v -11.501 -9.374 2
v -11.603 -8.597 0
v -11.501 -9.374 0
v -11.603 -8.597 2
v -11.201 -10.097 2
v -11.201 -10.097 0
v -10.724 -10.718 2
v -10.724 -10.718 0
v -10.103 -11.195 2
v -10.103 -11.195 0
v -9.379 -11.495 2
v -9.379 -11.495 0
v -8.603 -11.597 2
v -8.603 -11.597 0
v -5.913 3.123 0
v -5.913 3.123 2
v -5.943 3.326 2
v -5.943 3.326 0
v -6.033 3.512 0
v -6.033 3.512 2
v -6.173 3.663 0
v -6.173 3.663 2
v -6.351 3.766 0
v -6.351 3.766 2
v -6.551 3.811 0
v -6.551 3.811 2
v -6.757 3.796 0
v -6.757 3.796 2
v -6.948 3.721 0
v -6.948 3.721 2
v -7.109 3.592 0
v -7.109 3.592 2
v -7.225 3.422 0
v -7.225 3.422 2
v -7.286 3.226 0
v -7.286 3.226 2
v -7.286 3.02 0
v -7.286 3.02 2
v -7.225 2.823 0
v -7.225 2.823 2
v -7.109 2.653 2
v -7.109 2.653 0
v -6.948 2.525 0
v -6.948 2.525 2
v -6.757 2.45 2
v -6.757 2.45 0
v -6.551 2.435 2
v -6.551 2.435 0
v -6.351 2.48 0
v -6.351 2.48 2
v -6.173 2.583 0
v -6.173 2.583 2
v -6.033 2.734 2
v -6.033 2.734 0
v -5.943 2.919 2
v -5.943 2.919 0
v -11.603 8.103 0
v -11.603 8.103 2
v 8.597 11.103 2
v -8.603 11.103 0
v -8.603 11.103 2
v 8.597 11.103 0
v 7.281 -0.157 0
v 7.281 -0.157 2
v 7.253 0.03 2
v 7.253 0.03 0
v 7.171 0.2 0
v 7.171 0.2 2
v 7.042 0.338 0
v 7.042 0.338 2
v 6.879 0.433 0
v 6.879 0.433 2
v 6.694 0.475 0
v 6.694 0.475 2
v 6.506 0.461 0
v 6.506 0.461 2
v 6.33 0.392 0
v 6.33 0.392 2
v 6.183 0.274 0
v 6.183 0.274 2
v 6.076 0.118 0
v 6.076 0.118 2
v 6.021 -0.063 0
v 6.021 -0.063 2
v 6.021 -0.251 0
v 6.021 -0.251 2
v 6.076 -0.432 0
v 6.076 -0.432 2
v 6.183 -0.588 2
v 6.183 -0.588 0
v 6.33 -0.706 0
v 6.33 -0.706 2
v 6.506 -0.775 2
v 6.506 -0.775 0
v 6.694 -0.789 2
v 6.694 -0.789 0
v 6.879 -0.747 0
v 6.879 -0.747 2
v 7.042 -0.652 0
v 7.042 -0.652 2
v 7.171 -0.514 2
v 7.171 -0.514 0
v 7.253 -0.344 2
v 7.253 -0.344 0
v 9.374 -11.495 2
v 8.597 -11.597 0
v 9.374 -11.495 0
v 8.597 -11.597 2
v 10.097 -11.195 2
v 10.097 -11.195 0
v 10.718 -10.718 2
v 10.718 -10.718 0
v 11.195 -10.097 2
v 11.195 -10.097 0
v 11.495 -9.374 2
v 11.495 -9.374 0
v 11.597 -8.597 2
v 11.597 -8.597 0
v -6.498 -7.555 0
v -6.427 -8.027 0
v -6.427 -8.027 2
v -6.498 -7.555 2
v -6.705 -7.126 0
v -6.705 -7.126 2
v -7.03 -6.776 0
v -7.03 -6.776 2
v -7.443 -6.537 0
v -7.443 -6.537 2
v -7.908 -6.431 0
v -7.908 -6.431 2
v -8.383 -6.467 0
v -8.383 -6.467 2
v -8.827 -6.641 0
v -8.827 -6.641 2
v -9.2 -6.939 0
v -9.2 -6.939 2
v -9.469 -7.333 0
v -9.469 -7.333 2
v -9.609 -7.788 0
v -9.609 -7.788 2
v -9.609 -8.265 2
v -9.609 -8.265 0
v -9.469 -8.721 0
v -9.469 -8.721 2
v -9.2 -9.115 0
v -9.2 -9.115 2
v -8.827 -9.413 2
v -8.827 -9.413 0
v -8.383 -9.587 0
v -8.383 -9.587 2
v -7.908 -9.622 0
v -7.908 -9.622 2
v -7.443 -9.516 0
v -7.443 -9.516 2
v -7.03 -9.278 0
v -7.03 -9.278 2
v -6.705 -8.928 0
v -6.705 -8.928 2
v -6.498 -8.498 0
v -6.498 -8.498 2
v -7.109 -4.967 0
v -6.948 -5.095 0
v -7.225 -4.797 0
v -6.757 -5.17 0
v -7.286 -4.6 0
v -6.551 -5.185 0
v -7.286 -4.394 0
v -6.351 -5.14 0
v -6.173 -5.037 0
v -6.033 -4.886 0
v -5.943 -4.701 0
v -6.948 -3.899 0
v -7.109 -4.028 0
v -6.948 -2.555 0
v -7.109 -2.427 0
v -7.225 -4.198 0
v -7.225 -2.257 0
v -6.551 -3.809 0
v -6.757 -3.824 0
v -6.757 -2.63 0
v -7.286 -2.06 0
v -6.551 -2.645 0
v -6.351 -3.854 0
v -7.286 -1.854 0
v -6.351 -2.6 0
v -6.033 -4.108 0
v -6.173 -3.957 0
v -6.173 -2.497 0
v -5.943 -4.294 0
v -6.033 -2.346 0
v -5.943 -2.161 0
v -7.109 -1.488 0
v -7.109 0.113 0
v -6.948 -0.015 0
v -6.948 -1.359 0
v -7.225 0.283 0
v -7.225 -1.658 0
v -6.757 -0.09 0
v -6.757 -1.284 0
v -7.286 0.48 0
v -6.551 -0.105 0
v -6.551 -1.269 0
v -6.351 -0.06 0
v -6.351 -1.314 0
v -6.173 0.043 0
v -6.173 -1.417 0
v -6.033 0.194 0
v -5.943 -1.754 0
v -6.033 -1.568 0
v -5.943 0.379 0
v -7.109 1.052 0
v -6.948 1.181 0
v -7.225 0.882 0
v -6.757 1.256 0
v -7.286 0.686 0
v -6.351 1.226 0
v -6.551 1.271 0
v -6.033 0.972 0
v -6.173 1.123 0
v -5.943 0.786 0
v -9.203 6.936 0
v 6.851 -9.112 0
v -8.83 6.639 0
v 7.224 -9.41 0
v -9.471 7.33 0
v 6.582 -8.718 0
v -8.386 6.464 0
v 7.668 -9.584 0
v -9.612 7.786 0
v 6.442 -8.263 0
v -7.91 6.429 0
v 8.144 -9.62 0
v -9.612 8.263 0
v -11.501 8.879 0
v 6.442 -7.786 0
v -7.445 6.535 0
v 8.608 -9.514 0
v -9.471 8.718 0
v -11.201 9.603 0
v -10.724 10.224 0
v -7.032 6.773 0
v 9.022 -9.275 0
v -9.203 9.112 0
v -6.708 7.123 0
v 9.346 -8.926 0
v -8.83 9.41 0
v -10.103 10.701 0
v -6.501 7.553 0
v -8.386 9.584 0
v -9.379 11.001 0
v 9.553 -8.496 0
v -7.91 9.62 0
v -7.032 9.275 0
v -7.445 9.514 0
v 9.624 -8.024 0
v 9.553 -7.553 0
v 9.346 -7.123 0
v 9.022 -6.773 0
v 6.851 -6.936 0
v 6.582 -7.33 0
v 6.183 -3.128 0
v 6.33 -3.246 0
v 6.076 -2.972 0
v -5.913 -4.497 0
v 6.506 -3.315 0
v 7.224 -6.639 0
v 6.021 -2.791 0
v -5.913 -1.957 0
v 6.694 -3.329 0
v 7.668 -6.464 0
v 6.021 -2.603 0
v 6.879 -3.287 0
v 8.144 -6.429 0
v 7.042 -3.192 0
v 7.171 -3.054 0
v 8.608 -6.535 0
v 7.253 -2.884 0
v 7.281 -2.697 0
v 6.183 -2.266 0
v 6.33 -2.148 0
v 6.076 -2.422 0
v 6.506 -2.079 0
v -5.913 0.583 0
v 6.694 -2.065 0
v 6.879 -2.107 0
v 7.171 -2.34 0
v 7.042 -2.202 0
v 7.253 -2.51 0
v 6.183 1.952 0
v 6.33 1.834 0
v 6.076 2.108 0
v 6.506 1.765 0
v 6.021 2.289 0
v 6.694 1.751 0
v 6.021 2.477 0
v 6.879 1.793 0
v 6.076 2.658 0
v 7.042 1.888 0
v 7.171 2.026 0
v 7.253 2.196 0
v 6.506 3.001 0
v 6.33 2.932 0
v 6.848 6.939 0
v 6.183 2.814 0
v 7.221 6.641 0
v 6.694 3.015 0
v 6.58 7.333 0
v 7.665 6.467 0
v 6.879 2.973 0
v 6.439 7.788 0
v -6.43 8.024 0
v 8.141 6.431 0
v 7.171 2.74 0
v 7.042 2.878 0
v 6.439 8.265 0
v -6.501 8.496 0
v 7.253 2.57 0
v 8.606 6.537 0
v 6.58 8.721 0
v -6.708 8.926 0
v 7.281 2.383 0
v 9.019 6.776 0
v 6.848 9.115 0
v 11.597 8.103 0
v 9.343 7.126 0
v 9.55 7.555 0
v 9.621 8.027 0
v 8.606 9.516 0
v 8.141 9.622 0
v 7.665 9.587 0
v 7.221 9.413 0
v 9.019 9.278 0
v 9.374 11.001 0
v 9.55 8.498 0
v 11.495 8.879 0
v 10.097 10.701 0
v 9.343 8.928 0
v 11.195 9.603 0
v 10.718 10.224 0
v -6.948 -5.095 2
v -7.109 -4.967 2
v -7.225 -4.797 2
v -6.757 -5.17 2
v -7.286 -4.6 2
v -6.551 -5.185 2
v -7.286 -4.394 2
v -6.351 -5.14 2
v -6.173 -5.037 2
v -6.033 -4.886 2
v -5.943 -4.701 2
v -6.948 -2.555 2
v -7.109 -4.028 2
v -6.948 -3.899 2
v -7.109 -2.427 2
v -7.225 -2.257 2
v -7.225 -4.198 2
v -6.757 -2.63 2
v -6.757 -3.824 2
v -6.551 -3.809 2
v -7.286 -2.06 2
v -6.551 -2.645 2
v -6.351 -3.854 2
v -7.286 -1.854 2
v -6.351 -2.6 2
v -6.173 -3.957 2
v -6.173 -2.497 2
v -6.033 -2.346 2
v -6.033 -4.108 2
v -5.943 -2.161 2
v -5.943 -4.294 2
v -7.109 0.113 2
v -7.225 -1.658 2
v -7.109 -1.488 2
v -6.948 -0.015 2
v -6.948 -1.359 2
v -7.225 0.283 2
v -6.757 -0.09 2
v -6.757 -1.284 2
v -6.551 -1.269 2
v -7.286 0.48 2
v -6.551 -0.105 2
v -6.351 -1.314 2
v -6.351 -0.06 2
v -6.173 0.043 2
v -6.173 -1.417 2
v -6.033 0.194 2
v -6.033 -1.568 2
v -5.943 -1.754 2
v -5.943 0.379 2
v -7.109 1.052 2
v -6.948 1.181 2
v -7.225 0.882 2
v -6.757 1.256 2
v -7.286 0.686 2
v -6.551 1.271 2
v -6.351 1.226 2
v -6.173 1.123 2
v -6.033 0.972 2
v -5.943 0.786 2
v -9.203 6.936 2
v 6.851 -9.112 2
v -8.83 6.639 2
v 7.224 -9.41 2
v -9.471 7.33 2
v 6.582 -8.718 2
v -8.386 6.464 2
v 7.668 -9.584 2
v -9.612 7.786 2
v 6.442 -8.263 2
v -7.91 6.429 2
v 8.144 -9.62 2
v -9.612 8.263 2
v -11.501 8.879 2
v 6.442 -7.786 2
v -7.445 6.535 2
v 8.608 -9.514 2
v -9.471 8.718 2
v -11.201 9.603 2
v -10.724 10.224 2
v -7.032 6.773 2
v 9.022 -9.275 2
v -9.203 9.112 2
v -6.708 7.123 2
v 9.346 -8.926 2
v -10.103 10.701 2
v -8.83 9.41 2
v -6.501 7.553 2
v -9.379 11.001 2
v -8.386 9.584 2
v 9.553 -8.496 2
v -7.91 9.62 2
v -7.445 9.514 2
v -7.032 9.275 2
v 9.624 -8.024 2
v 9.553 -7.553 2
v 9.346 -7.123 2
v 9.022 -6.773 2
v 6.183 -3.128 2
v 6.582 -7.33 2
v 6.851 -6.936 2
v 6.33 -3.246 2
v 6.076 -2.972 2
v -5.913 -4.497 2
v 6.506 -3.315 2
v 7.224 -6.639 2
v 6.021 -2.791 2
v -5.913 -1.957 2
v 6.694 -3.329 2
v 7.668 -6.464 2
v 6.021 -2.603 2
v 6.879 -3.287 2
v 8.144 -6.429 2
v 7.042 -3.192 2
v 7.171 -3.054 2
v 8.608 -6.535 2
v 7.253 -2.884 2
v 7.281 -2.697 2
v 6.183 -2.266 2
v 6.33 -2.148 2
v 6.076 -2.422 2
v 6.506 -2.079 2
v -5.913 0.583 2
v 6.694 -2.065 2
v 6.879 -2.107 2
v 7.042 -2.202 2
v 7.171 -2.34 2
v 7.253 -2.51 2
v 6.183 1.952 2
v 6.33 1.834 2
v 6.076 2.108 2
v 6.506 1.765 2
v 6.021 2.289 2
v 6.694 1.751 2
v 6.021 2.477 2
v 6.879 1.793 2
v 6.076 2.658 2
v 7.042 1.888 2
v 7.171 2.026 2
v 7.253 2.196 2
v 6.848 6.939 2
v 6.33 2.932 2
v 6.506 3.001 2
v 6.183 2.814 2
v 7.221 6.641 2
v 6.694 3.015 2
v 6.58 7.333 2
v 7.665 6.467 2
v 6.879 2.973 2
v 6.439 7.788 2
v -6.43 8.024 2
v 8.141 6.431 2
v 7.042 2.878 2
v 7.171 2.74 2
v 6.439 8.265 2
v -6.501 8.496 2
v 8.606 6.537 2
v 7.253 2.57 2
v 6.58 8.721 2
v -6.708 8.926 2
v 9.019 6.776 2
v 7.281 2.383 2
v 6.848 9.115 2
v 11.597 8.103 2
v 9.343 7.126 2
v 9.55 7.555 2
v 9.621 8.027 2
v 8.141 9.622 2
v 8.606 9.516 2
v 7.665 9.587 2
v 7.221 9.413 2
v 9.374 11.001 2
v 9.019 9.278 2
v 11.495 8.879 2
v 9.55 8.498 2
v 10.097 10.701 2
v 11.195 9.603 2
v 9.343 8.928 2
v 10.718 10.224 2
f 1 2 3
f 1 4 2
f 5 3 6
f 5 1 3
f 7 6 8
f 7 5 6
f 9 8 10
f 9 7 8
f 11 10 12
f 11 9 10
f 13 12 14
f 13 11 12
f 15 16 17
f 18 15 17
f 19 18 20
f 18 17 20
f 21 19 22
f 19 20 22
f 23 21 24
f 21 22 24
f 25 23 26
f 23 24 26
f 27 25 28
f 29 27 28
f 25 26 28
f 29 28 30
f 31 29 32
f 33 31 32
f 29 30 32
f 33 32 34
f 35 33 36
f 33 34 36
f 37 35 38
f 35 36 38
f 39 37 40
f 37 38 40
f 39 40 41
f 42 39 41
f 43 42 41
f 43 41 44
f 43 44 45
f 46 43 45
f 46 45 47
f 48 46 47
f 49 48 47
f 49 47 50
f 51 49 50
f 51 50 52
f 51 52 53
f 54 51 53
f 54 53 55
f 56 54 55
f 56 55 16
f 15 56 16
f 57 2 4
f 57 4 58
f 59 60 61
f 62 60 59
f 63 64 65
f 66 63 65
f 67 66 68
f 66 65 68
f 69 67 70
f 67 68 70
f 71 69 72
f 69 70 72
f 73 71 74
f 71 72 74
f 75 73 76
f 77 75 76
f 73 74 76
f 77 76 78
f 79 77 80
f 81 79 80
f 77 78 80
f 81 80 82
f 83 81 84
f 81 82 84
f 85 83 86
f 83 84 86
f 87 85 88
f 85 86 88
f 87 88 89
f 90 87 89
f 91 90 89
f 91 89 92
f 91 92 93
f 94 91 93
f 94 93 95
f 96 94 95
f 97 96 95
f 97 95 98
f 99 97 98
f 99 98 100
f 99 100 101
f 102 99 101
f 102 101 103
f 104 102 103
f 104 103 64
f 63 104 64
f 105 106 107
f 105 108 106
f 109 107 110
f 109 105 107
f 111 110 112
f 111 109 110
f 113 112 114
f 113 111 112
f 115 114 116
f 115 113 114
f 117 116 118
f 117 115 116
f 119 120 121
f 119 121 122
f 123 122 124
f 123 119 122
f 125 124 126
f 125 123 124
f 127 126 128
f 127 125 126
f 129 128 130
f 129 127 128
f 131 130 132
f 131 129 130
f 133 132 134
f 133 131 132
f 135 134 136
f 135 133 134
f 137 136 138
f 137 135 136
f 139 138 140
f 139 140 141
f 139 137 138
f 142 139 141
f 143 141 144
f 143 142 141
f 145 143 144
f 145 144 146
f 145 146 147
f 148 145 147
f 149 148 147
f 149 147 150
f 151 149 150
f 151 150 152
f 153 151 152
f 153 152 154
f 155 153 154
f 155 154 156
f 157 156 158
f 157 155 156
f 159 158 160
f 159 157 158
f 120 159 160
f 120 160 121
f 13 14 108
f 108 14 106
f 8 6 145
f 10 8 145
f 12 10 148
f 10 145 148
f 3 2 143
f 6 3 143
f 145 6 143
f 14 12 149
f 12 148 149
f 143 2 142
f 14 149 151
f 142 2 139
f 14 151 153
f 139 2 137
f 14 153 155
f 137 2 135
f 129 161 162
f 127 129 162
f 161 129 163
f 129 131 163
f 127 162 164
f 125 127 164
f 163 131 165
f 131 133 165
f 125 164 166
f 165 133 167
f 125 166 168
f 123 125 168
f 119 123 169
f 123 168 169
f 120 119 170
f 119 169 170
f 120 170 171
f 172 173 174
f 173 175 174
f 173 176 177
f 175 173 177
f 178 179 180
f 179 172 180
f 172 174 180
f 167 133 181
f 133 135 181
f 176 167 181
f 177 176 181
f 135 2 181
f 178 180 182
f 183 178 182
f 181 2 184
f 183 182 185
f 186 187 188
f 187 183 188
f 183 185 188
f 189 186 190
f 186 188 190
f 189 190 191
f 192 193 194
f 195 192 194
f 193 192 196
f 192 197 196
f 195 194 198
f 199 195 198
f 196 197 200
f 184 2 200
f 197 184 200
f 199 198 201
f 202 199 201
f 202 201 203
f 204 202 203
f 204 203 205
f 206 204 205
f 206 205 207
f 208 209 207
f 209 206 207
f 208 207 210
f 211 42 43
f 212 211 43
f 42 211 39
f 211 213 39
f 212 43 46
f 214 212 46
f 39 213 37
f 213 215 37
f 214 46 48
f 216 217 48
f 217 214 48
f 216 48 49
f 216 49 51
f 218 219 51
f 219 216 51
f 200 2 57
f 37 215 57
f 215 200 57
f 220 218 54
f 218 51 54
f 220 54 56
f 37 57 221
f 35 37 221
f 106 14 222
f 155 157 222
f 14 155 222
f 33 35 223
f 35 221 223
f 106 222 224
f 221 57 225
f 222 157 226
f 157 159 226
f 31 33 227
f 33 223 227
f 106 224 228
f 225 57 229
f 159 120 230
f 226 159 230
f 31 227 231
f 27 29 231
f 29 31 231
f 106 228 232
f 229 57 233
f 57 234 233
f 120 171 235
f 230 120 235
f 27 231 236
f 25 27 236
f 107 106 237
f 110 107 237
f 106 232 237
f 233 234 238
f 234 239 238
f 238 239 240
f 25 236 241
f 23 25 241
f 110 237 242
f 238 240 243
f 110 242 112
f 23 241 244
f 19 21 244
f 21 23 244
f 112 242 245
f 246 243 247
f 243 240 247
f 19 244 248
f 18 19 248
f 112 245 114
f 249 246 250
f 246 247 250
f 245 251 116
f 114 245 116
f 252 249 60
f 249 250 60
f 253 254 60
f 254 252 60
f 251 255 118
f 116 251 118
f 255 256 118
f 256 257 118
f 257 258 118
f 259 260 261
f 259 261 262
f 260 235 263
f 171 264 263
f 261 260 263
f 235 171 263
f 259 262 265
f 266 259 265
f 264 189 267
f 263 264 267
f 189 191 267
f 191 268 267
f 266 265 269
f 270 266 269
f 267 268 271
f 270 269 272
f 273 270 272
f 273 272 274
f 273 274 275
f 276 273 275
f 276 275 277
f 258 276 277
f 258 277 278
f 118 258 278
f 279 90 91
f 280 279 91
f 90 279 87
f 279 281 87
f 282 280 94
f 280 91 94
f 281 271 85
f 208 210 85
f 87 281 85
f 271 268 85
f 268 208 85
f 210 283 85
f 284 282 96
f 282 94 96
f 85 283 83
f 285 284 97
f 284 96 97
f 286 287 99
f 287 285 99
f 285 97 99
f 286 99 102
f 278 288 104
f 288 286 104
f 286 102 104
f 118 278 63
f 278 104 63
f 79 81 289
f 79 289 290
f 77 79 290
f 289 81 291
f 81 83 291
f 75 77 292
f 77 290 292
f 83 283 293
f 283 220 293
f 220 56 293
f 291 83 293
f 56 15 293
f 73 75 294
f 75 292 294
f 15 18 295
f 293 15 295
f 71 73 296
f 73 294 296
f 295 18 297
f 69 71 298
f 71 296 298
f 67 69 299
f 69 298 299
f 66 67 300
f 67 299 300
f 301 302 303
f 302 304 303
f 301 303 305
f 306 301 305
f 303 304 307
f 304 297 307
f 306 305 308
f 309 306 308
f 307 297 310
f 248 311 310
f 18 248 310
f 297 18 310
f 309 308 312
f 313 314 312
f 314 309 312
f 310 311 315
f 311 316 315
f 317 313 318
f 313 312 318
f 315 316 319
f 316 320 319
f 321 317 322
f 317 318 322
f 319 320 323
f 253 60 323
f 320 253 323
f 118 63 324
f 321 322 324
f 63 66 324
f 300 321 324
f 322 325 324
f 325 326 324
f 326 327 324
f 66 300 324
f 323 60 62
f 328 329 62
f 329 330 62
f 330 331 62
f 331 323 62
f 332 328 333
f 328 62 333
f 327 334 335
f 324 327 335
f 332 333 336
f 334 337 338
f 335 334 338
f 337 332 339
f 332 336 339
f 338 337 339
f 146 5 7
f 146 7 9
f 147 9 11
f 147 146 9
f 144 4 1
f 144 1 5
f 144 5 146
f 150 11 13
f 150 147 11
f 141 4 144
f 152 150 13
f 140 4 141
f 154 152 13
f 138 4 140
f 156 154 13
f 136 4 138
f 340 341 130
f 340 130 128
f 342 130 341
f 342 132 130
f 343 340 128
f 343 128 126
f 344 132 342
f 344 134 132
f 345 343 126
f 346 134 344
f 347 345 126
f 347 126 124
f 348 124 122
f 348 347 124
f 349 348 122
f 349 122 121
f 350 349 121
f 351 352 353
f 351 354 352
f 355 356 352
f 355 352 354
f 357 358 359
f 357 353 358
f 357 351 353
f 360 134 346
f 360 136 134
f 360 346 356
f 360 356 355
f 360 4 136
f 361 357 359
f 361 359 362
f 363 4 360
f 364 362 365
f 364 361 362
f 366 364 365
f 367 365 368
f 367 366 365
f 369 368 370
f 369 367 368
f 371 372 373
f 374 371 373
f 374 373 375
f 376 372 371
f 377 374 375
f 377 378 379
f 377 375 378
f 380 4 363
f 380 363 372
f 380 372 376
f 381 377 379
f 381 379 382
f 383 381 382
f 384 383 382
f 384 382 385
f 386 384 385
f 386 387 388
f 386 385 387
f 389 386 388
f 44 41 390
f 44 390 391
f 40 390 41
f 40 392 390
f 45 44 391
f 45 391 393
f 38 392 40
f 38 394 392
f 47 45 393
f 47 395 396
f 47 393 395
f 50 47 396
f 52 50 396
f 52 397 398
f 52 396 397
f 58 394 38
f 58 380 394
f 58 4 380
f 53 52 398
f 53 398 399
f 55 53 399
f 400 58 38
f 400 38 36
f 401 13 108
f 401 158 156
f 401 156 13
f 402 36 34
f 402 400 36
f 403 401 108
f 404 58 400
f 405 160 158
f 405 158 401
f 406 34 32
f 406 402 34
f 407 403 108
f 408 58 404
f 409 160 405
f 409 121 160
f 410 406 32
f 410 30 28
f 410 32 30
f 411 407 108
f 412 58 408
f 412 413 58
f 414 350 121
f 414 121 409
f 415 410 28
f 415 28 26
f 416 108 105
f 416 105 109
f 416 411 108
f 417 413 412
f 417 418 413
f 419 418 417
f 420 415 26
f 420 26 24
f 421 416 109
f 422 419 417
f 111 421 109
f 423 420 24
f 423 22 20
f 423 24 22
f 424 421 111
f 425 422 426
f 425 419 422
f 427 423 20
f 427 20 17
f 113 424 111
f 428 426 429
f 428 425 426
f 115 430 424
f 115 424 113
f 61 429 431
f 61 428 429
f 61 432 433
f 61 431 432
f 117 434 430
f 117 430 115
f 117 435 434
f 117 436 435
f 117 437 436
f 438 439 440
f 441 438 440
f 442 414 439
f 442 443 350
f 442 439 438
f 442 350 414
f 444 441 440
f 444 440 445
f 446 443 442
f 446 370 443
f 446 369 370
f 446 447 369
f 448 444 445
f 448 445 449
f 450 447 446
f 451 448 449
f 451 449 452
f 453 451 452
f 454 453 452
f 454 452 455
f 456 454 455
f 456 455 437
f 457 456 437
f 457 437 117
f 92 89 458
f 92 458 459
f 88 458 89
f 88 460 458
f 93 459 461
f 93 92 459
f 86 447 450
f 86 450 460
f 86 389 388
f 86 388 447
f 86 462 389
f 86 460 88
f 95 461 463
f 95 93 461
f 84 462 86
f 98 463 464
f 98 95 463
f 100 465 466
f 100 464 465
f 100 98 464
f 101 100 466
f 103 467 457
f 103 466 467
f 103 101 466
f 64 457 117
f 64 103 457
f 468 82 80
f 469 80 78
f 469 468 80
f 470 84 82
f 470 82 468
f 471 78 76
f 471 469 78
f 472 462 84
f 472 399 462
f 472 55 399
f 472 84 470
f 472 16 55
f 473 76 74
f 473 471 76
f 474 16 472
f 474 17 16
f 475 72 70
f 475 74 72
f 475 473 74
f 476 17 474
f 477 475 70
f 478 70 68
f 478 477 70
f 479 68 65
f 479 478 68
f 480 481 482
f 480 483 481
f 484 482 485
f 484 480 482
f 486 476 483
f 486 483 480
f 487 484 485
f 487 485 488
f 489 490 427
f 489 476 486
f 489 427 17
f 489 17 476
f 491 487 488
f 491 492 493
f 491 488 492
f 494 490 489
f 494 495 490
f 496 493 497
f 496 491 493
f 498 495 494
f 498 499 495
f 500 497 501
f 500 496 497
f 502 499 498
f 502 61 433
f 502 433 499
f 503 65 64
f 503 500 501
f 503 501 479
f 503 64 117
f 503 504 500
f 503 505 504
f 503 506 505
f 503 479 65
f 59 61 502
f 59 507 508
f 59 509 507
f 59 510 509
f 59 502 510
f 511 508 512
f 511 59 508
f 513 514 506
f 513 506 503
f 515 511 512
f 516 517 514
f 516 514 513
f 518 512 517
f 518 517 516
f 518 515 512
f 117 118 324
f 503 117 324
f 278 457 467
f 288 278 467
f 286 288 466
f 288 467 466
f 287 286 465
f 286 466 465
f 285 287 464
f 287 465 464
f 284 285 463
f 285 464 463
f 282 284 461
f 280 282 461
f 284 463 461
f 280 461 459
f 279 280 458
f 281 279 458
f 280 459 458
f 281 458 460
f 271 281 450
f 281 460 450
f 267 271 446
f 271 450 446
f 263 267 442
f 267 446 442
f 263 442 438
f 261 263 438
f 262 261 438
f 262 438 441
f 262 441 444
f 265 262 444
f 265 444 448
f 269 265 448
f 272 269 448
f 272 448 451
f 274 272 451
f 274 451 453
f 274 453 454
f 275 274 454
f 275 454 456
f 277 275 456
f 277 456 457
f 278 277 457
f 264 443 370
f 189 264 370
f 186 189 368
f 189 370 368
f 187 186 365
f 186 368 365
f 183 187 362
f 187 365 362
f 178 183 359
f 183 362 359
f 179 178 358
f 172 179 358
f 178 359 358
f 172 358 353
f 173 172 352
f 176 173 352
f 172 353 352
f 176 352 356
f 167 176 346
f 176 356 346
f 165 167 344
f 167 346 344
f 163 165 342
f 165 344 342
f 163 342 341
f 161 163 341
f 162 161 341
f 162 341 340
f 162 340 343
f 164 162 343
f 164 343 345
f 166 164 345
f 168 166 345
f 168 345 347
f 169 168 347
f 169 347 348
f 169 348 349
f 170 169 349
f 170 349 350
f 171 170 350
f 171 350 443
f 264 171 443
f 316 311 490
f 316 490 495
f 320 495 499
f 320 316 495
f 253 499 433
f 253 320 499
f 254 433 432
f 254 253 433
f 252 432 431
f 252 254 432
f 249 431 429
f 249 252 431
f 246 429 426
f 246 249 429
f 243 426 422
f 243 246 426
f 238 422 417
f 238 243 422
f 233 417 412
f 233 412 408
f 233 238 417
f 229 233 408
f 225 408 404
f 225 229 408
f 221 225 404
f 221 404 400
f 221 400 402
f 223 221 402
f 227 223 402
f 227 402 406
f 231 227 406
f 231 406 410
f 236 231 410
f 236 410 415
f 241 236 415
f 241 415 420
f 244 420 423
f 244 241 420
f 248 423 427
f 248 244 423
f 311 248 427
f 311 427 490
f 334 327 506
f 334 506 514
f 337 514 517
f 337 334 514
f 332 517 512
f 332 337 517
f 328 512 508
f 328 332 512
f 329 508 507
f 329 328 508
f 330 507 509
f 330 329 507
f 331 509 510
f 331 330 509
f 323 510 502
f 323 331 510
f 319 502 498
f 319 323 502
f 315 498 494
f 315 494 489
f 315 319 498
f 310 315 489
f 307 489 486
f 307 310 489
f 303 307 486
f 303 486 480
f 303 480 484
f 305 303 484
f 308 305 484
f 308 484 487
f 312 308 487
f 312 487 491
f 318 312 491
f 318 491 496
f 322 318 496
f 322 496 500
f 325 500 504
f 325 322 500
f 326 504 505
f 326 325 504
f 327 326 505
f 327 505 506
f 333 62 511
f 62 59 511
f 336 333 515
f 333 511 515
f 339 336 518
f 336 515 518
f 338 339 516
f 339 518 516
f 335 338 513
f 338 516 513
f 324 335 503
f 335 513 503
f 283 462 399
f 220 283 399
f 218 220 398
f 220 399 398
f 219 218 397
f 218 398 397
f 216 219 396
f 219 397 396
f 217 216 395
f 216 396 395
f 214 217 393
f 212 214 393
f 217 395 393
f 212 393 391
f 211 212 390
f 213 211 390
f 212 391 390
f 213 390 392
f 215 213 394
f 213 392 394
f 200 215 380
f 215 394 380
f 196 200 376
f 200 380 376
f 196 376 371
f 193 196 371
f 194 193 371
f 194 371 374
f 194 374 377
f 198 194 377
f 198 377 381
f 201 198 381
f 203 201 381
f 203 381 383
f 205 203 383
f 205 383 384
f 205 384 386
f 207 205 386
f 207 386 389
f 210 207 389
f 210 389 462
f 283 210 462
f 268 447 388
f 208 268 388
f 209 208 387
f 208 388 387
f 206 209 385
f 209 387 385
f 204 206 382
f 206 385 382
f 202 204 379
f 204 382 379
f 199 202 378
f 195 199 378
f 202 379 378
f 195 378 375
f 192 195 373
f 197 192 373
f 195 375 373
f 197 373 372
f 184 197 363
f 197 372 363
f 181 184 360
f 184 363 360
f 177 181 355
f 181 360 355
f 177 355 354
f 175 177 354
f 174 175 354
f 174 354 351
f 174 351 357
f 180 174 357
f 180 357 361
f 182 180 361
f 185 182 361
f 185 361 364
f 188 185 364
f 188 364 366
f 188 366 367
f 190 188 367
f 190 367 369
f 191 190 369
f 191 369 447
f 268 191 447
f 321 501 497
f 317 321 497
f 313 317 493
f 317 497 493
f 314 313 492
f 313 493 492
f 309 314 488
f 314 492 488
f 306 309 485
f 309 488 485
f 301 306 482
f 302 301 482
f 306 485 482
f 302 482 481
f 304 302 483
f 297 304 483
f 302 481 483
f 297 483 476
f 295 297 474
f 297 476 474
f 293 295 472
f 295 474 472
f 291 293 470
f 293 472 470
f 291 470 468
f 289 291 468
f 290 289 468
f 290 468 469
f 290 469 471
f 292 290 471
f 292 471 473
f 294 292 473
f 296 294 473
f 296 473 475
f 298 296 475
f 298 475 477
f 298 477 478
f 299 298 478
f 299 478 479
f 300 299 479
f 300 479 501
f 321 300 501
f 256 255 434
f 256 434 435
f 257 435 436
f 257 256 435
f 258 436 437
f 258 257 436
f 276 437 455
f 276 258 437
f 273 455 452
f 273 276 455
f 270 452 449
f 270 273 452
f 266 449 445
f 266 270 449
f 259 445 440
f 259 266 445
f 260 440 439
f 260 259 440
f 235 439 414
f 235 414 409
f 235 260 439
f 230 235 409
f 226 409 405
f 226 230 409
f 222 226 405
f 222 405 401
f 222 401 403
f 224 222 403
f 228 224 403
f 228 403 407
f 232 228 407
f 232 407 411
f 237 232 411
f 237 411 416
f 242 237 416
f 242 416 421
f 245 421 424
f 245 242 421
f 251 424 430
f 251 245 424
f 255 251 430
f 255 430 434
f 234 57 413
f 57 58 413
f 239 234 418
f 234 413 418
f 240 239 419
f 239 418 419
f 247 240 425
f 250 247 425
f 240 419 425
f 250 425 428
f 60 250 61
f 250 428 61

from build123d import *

# Parameters (mm, degrees)
SKETCH1_W           = 23.2
SKETCH1_H           = 22.7
SKETCH1_R           = 1.6
BOSS_EXTRUDE1_DEPTH = 2
FILLET1_R           = 3
SKETCH2_R           = 0.633596253
SKETCH2_R_2         = 0.690319611
CUT_EXTRUDE1_DEPTH  = 17.526342483


with BuildPart() as part:
    # Sketch1 → Boss-Extrude1 (new body)
    with BuildSketch(Plane.XY):
        with Locations((-0.002931945, -0.247067135)):
            Rectangle(SKETCH1_W, SKETCH1_H)
        with Locations((-8.029814258, 8.024213837)):
            Circle(SKETCH1_R, mode=Mode.SUBTRACT)
        with Locations((8.021282811, 8.026881394)):
            Circle(SKETCH1_R, mode=Mode.SUBTRACT)
        with Locations((8.023950367, -8.024215675)):
            Circle(SKETCH1_R, mode=Mode.SUBTRACT)
        with Locations((-8.027146702, -8.026883232)):
            Circle(SKETCH1_R, mode=Mode.SUBTRACT)
    extrude(amount=BOSS_EXTRUDE1_DEPTH)

    # Fillet1
    fillet1_edges = [part.edges().sort_by_distance(p)[0] for p in [
        (11.597068055, -11.597067135, 1),
        (-11.602931945, -11.597067135, 1),
        (-11.602931945, 11.102932865, 1),
        (11.597068055, 11.102932865, 1),
    ]]
    fillet(fillet1_edges, radius=FILLET1_R)

    # Sketch2 → Cut-Extrude1 (cut, through all)
    with BuildSketch(Plane.XY.offset(2)):
        with Locations((6.647068055, -2.697067135)):
            Circle(SKETCH2_R)
        with Locations((6.647068055, -0.157067135)):
            Circle(SKETCH2_R)
        with Locations((6.647068055, 2.382932865)):
            Circle(SKETCH2_R)
        with Locations((-6.602931945, -4.497067135)):
            Circle(SKETCH2_R_2)
        with Locations((-6.602931945, -1.957067135)):
            Circle(SKETCH2_R_2)
        with Locations((-6.602931945, 0.582932865)):
            Circle(SKETCH2_R_2)
        with Locations((-6.602931945, 3.122932865)):
            Circle(SKETCH2_R_2)
    extrude(amount=-CUT_EXTRUDE1_DEPTH, mode=Mode.SUBTRACT)


solid = part.part
